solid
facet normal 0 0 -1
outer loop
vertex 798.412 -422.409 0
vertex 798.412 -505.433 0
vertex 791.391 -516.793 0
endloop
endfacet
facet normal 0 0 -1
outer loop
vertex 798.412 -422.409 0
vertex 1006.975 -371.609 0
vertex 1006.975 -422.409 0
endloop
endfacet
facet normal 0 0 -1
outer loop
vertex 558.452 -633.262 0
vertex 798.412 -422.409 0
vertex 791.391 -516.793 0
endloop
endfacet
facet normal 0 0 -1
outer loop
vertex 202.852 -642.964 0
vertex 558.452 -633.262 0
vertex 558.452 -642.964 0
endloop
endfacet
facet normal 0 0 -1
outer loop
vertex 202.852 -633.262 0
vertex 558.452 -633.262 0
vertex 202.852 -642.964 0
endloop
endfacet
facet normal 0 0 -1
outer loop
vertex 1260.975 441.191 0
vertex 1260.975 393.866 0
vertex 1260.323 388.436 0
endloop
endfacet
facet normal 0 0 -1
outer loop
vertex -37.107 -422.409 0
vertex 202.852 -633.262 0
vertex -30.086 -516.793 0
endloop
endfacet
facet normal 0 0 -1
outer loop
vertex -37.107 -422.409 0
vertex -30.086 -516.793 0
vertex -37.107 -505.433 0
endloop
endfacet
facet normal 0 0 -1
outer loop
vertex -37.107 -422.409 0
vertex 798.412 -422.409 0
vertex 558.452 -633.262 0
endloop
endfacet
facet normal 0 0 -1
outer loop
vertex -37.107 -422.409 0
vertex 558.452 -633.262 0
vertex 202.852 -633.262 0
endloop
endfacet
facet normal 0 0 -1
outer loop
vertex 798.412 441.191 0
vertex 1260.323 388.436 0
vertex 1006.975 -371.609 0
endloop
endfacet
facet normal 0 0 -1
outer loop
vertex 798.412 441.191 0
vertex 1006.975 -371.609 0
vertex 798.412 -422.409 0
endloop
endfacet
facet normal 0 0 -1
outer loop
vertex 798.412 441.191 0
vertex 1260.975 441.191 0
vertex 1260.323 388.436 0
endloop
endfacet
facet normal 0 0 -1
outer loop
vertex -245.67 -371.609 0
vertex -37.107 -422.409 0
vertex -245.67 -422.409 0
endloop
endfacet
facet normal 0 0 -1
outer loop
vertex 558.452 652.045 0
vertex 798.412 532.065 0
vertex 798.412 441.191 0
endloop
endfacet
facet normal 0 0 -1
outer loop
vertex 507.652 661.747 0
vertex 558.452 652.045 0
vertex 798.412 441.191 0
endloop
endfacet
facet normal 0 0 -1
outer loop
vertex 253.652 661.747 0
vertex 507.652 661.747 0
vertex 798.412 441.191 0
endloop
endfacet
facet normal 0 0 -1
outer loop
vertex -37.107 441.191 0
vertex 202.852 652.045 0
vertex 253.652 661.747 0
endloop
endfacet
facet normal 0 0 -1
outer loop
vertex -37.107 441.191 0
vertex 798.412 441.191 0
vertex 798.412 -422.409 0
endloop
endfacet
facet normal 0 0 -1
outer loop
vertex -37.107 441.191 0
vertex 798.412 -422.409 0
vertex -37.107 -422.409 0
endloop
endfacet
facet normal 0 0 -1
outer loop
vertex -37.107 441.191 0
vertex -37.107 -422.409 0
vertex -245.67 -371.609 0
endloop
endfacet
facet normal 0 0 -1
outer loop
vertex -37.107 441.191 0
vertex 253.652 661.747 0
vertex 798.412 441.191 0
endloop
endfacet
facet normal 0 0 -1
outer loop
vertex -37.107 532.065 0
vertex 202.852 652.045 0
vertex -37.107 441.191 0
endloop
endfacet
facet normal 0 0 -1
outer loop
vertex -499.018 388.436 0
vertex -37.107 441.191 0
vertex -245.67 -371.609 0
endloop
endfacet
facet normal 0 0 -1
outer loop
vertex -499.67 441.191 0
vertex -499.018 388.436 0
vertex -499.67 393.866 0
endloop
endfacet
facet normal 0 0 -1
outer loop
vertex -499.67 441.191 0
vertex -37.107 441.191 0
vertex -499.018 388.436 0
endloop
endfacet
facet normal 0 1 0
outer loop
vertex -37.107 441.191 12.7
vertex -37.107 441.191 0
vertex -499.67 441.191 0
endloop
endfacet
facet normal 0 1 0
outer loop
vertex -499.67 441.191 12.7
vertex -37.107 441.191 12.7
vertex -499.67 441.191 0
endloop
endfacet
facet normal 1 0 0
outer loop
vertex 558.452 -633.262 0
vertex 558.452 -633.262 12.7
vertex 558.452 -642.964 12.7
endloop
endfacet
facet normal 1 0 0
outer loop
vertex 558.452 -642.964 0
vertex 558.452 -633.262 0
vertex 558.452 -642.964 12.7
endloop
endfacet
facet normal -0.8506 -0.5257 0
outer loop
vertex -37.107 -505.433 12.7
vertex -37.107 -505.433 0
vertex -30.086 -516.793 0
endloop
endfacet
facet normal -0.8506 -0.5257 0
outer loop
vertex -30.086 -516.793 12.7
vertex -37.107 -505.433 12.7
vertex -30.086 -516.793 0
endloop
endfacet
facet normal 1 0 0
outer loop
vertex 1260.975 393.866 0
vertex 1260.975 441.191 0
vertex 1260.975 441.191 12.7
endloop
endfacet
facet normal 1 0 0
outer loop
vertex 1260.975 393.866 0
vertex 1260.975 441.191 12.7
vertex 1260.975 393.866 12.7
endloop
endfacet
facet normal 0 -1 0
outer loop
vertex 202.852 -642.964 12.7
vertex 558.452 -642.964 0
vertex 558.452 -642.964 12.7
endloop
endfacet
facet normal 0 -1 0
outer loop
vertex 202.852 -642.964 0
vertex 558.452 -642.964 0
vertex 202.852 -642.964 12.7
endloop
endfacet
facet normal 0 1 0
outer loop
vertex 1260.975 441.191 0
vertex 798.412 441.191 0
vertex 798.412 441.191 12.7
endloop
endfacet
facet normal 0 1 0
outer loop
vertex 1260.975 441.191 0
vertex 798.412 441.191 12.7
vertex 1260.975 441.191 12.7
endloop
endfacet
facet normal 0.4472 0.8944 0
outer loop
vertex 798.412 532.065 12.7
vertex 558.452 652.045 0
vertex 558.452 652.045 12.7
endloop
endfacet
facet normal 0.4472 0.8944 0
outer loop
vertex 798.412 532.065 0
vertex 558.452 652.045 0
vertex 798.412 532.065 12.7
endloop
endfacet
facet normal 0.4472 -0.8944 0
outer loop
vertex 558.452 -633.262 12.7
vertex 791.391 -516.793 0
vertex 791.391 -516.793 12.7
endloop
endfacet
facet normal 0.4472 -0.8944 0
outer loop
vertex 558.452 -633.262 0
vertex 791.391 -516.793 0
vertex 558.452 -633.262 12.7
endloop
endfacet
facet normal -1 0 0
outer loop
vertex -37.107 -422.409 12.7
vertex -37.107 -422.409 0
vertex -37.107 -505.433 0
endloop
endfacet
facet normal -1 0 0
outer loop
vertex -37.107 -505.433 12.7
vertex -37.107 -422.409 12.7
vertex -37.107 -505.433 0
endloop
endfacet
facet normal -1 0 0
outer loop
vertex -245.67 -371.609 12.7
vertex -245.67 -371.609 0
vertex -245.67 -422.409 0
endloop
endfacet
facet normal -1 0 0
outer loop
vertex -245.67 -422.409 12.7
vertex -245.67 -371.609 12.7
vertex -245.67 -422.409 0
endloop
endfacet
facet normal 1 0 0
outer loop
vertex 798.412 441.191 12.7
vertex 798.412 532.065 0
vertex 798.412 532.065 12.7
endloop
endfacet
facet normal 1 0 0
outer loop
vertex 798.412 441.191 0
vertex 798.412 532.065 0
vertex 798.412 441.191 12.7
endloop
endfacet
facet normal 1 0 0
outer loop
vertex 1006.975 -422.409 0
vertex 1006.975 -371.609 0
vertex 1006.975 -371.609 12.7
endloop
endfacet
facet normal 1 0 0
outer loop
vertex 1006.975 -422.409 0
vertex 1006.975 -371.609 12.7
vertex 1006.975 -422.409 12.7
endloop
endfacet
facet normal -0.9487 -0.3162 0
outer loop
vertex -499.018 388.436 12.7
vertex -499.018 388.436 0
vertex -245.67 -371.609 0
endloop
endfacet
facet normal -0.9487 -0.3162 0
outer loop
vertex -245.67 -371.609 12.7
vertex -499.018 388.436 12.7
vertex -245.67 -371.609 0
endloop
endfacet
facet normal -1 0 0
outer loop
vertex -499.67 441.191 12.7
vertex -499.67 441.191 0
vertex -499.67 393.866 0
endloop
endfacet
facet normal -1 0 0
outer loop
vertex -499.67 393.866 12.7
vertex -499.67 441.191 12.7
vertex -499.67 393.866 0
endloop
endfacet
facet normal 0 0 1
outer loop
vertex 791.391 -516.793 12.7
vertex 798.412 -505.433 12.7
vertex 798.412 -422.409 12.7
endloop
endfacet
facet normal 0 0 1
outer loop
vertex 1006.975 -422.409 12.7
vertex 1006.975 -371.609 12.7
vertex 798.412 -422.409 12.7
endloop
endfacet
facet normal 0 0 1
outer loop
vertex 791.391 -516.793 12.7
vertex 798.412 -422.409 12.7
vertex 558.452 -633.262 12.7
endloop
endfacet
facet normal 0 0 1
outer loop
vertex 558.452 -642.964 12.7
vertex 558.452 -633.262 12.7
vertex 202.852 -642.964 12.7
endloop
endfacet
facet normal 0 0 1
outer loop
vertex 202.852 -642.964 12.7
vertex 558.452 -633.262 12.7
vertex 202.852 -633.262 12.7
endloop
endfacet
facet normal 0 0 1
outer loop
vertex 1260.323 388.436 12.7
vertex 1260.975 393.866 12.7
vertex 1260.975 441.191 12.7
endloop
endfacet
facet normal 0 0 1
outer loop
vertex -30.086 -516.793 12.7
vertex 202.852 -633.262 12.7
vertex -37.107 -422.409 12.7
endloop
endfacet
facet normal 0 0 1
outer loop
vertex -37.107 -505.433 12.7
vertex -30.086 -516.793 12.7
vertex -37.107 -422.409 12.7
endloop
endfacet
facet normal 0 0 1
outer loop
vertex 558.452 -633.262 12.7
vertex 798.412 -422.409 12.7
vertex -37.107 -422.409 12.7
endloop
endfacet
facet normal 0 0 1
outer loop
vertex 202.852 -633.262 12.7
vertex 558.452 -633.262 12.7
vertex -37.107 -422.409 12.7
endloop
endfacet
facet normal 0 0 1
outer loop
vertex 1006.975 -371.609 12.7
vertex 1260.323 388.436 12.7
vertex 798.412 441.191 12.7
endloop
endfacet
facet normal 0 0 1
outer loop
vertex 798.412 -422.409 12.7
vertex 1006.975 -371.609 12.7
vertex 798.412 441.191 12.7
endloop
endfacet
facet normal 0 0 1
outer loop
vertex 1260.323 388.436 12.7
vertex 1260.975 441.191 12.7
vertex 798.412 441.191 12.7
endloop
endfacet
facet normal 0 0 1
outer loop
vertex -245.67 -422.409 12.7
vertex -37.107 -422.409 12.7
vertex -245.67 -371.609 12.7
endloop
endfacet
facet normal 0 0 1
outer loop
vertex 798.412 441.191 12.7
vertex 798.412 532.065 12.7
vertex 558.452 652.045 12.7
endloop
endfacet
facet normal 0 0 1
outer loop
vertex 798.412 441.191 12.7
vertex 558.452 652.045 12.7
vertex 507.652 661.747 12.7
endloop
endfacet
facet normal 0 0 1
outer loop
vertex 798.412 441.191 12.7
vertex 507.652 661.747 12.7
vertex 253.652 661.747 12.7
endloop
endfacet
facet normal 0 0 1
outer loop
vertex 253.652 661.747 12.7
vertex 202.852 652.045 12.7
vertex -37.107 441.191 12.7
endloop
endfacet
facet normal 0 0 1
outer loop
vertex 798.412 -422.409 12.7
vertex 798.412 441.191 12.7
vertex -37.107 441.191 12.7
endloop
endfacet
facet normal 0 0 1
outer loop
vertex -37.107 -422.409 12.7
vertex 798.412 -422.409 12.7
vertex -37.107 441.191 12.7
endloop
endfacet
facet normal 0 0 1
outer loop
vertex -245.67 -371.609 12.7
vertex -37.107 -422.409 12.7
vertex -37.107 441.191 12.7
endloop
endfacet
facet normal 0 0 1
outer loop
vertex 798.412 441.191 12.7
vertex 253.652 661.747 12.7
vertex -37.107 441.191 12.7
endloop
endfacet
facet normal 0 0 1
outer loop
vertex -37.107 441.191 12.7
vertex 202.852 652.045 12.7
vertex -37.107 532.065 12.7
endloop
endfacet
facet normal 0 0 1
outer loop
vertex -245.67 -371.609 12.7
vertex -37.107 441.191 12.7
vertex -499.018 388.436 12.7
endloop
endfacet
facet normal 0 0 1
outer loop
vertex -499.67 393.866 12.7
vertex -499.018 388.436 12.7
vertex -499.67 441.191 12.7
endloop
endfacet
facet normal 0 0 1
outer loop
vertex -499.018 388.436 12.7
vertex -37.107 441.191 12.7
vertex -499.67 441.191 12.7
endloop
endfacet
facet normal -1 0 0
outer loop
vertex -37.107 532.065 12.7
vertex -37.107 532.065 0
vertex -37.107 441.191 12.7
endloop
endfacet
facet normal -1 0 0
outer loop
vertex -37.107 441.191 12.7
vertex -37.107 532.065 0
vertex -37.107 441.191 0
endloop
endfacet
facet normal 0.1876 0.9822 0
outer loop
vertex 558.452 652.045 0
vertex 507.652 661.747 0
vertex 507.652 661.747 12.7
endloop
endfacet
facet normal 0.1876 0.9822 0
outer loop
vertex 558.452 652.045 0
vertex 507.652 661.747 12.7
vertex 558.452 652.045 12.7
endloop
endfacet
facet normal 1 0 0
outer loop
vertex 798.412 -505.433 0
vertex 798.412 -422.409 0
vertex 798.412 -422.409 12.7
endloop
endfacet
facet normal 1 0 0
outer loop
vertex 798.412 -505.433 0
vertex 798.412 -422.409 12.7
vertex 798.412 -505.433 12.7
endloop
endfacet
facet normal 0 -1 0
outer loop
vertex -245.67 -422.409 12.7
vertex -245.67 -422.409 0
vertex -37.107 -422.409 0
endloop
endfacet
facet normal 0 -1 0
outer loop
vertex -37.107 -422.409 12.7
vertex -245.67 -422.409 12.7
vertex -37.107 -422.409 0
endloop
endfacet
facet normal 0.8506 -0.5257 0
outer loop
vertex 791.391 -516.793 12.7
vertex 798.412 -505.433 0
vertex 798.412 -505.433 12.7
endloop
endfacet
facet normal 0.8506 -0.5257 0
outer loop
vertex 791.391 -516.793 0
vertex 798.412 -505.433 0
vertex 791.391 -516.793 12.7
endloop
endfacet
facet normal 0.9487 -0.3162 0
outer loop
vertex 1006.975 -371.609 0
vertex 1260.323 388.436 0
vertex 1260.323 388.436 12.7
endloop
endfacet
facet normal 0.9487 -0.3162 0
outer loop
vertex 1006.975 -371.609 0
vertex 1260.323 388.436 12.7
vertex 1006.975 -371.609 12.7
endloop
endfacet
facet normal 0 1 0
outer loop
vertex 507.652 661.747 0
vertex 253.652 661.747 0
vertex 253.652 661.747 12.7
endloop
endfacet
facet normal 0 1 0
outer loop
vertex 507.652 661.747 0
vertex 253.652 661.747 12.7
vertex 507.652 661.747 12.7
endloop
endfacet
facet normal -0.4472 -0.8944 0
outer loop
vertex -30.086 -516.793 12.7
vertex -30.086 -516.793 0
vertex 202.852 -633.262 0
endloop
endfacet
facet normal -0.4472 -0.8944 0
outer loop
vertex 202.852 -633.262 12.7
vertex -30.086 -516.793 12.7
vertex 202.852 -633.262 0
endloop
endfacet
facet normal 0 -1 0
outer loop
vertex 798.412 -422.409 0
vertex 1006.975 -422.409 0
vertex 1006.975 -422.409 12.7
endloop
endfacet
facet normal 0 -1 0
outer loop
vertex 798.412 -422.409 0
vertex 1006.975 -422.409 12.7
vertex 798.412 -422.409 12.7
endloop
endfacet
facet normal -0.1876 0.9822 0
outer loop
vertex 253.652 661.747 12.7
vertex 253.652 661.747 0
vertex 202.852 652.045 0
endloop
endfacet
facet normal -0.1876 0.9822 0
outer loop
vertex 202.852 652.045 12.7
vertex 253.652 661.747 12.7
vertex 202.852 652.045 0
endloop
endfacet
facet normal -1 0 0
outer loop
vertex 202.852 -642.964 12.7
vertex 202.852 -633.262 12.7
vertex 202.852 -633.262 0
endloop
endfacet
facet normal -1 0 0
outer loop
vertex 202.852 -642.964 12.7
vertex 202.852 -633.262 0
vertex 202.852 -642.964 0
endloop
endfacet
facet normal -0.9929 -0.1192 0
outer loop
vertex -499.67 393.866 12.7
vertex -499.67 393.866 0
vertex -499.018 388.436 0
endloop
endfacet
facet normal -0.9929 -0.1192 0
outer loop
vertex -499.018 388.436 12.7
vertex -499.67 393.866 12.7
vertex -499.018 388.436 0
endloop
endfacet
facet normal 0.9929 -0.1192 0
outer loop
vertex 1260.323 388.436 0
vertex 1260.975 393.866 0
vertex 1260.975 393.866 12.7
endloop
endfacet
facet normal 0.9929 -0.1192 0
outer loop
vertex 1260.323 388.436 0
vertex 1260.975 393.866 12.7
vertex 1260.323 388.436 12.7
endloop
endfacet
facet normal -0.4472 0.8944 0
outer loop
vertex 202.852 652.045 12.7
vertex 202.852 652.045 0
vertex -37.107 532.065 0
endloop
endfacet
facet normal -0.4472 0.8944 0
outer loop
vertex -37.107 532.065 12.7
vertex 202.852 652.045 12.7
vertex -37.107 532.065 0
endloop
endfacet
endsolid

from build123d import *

# Parameters (mm, degrees)
BOSS_EXTRUDE1_DEPTH = 12.7


with BuildPart() as part:
    # Sketch1 → Boss-Extrude1 (new body)
    with BuildSketch(Plane.XY):
        Polygon((-207.569853327, -422.408510368), (-37.10675463, -422.408510368), (-37.10675463, -505.433281316), (-30.086367293, -516.792506642), (202.852470696, -633.261925636), (202.852470696, -642.963862322), (380.652470696, -642.963862322), (380.652470696, 661.746841587), (253.652470696, 661.746841587), (202.852470696, 652.044904901), (-37.10675463, 532.065292238), (-37.10675463, 441.191489632), (-461.569853327, 441.191489632), (-499.669853327, 441.191489632), (-499.669853327, 393.865899836), (-499.018131212, 388.436323288), (-245.669853327, -371.608510368), (-245.669853327, -422.408510368), align=None)
    extrude(amount=BOSS_EXTRUDE1_DEPTH)

    # Mirror1: part across plane


with BuildPart() as part_1:
    add(part.part)
    add(part.part.mirror(Plane(origin=(380.652470696, 661.746841587, 12.7), x_dir=(0, 0, 1), z_dir=(-1, 0, 0))))


solid = part_1.part
